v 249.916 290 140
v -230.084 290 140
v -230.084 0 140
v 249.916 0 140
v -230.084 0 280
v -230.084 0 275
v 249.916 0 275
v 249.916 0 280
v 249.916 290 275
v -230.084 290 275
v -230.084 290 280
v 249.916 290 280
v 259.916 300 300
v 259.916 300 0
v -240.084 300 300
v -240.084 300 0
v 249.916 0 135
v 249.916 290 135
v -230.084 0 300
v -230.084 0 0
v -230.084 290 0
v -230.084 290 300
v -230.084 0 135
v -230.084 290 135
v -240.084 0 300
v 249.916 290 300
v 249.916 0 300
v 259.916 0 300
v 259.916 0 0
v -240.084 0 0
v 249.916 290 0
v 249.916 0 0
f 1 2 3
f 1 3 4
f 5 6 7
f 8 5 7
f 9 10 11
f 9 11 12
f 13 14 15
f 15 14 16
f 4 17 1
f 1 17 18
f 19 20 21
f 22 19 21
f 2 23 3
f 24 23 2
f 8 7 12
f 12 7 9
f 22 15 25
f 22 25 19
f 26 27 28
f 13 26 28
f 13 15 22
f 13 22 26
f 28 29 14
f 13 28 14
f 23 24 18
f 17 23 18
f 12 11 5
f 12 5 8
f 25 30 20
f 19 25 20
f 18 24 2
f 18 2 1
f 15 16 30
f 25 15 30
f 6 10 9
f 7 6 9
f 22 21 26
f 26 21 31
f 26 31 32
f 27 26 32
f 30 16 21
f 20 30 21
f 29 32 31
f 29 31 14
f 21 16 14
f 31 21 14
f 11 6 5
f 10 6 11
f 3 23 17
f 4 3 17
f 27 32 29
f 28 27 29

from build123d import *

# Parameters (mm, degrees)
F1_DEPTH = 300
F3_W     = 480
F3_H     = 290
F4_DEPTH = 5
F6_W     = 480
F6_H     = 290
F7_DEPTH = 5


with BuildPart() as f1:
    # F0 (on Top) → F1 (new body)
    with BuildSketch(Plane.XY):
        Polygon((259.9160554688, 300), (-240.0839445312, 300), (-240.0839445312, 0), (-230.0839445312, 0), (-230.0839445312, 290), (249.9160554688, 290), (249.9160554688, 0), (259.9160554688, 0), align=None)
    extrude(amount=F1_DEPTH)


with BuildPart() as f4:
    # F3 (on offset) → F4 (new body)
    with BuildSketch(Plane.XY.offset(135)):
        with Locations((9.9160554688, 145)):
            Rectangle(F3_W, F3_H)
    extrude(amount=F4_DEPTH)


with BuildPart() as f7:
    # F6 (on offset) → F7 (new body)
    with BuildSketch(Plane.XY.offset(275)):
        with Locations((9.9160554688, 145)):
            Rectangle(F6_W, F6_H)
    extrude(amount=F7_DEPTH)


solid = Compound([f1.part, f4.part, f7.part])
